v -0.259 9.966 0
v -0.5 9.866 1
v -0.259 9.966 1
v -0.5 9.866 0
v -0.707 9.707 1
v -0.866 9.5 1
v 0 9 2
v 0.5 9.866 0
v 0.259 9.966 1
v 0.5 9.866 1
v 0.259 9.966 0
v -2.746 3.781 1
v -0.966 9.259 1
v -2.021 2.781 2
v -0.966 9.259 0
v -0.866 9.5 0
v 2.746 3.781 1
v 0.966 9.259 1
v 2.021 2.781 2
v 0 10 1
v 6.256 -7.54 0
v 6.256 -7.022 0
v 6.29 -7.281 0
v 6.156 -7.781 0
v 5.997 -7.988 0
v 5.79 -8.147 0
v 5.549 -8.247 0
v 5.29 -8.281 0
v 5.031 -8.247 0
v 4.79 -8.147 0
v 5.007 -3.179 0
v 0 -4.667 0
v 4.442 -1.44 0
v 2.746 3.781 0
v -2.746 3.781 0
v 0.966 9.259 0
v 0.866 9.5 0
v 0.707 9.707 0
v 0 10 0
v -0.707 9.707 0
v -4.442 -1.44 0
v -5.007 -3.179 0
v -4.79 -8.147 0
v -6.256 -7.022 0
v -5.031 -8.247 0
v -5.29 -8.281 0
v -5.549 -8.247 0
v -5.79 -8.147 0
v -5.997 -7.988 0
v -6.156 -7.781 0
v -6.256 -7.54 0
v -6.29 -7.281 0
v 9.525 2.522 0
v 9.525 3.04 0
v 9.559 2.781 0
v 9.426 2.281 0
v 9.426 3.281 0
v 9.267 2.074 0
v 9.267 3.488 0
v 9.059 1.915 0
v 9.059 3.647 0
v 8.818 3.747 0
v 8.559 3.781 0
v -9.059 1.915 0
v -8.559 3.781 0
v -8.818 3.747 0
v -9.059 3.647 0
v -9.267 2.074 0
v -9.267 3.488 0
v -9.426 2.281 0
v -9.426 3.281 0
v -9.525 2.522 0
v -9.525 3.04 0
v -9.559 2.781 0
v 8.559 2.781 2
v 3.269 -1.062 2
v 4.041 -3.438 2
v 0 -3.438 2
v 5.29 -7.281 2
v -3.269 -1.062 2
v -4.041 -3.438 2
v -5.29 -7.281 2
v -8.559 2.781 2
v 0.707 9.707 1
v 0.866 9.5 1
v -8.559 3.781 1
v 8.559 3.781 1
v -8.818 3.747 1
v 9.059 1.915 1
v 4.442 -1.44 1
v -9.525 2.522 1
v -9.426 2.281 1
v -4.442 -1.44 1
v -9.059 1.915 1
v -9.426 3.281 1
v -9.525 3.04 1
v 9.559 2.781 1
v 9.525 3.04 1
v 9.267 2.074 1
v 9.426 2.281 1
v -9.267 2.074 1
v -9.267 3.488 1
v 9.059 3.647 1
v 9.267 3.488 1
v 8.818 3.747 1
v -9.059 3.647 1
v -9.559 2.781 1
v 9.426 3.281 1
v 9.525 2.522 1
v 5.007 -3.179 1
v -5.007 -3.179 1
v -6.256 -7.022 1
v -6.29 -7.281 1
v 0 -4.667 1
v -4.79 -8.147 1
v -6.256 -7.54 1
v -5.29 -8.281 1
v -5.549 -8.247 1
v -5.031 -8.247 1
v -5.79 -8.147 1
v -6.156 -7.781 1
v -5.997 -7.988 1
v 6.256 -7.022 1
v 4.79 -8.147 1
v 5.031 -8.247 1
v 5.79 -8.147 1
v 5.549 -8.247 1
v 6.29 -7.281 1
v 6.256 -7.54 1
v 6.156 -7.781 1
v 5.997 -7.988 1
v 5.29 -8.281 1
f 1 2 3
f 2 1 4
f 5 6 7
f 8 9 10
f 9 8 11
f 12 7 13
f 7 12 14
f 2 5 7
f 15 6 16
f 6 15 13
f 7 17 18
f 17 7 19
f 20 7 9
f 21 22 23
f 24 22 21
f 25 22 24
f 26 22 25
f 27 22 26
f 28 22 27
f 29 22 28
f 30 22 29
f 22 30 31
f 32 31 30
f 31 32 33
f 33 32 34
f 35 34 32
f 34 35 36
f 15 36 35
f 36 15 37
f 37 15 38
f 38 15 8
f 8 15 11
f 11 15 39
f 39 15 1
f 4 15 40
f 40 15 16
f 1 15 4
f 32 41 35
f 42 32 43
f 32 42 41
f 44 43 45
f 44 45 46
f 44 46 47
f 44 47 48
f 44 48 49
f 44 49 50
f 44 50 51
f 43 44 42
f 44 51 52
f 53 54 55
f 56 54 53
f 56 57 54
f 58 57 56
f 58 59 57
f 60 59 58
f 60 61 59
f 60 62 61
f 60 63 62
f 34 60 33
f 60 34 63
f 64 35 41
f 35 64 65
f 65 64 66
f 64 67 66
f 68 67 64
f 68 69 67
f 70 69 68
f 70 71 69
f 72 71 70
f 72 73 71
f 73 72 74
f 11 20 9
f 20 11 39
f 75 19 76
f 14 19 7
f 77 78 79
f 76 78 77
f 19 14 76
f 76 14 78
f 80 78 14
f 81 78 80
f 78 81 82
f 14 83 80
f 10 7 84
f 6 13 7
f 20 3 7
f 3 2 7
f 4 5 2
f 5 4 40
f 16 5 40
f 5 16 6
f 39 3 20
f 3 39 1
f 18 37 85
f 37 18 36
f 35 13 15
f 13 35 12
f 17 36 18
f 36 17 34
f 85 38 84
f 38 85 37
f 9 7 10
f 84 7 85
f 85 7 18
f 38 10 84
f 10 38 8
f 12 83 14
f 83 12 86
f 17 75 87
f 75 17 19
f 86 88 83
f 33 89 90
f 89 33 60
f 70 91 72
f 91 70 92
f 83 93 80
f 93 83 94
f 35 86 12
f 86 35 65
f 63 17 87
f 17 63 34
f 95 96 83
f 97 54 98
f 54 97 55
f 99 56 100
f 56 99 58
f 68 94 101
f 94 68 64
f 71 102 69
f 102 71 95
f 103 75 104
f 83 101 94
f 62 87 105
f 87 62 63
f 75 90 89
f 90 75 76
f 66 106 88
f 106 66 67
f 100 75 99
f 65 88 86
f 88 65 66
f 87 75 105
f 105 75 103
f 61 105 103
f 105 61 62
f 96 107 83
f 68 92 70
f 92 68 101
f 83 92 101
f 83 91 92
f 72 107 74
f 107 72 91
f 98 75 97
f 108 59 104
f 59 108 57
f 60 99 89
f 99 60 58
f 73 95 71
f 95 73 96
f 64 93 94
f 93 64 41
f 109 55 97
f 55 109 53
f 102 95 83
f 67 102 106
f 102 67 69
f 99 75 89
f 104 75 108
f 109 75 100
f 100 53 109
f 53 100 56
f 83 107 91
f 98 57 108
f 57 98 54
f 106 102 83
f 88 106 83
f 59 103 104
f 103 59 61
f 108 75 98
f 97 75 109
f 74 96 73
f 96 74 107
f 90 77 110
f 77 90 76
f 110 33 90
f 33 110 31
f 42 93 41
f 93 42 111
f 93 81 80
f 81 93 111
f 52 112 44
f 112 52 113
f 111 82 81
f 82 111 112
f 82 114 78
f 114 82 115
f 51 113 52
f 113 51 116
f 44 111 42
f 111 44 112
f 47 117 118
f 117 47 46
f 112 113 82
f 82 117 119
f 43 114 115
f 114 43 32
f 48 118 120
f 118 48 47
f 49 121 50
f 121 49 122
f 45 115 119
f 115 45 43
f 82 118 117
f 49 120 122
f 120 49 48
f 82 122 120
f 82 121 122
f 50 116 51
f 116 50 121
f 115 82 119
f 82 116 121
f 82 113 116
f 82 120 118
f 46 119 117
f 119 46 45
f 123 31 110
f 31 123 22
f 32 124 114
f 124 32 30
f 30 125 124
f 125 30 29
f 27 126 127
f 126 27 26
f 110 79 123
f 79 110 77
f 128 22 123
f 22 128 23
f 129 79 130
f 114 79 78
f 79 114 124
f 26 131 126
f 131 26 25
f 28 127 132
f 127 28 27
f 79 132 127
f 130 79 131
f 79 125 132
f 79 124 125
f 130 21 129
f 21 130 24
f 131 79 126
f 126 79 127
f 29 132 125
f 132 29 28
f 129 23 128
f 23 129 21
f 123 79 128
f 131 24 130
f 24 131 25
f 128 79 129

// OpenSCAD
radius = 10; // [ 5 : 0.5 : 20 ]
rounding = 1.0; // [ 0 : 0.5 : 2.5 ]

module star_flat(r) {
    x = tan(18) * r;
    y = r;

    for (a = [1 : 5])
    rotate(360 / 5 * a)
    polygon([
        [-x, 0],
        [x, 0],
        [0, y],
    ]);
}

module rounder(r, t) {
    $fn = 24;

    rotate_extrude()
    polygon([
        [0, 0],
        [r, 0],
        [0, t],
    ]);
}

module star(r, t) {
    minkowski() {
        linear_extrude(max(t - 1, 0.01))
        star_flat(r - rounding);

        rounder(rounding, 1);
    }
}

star(radius, 2);
